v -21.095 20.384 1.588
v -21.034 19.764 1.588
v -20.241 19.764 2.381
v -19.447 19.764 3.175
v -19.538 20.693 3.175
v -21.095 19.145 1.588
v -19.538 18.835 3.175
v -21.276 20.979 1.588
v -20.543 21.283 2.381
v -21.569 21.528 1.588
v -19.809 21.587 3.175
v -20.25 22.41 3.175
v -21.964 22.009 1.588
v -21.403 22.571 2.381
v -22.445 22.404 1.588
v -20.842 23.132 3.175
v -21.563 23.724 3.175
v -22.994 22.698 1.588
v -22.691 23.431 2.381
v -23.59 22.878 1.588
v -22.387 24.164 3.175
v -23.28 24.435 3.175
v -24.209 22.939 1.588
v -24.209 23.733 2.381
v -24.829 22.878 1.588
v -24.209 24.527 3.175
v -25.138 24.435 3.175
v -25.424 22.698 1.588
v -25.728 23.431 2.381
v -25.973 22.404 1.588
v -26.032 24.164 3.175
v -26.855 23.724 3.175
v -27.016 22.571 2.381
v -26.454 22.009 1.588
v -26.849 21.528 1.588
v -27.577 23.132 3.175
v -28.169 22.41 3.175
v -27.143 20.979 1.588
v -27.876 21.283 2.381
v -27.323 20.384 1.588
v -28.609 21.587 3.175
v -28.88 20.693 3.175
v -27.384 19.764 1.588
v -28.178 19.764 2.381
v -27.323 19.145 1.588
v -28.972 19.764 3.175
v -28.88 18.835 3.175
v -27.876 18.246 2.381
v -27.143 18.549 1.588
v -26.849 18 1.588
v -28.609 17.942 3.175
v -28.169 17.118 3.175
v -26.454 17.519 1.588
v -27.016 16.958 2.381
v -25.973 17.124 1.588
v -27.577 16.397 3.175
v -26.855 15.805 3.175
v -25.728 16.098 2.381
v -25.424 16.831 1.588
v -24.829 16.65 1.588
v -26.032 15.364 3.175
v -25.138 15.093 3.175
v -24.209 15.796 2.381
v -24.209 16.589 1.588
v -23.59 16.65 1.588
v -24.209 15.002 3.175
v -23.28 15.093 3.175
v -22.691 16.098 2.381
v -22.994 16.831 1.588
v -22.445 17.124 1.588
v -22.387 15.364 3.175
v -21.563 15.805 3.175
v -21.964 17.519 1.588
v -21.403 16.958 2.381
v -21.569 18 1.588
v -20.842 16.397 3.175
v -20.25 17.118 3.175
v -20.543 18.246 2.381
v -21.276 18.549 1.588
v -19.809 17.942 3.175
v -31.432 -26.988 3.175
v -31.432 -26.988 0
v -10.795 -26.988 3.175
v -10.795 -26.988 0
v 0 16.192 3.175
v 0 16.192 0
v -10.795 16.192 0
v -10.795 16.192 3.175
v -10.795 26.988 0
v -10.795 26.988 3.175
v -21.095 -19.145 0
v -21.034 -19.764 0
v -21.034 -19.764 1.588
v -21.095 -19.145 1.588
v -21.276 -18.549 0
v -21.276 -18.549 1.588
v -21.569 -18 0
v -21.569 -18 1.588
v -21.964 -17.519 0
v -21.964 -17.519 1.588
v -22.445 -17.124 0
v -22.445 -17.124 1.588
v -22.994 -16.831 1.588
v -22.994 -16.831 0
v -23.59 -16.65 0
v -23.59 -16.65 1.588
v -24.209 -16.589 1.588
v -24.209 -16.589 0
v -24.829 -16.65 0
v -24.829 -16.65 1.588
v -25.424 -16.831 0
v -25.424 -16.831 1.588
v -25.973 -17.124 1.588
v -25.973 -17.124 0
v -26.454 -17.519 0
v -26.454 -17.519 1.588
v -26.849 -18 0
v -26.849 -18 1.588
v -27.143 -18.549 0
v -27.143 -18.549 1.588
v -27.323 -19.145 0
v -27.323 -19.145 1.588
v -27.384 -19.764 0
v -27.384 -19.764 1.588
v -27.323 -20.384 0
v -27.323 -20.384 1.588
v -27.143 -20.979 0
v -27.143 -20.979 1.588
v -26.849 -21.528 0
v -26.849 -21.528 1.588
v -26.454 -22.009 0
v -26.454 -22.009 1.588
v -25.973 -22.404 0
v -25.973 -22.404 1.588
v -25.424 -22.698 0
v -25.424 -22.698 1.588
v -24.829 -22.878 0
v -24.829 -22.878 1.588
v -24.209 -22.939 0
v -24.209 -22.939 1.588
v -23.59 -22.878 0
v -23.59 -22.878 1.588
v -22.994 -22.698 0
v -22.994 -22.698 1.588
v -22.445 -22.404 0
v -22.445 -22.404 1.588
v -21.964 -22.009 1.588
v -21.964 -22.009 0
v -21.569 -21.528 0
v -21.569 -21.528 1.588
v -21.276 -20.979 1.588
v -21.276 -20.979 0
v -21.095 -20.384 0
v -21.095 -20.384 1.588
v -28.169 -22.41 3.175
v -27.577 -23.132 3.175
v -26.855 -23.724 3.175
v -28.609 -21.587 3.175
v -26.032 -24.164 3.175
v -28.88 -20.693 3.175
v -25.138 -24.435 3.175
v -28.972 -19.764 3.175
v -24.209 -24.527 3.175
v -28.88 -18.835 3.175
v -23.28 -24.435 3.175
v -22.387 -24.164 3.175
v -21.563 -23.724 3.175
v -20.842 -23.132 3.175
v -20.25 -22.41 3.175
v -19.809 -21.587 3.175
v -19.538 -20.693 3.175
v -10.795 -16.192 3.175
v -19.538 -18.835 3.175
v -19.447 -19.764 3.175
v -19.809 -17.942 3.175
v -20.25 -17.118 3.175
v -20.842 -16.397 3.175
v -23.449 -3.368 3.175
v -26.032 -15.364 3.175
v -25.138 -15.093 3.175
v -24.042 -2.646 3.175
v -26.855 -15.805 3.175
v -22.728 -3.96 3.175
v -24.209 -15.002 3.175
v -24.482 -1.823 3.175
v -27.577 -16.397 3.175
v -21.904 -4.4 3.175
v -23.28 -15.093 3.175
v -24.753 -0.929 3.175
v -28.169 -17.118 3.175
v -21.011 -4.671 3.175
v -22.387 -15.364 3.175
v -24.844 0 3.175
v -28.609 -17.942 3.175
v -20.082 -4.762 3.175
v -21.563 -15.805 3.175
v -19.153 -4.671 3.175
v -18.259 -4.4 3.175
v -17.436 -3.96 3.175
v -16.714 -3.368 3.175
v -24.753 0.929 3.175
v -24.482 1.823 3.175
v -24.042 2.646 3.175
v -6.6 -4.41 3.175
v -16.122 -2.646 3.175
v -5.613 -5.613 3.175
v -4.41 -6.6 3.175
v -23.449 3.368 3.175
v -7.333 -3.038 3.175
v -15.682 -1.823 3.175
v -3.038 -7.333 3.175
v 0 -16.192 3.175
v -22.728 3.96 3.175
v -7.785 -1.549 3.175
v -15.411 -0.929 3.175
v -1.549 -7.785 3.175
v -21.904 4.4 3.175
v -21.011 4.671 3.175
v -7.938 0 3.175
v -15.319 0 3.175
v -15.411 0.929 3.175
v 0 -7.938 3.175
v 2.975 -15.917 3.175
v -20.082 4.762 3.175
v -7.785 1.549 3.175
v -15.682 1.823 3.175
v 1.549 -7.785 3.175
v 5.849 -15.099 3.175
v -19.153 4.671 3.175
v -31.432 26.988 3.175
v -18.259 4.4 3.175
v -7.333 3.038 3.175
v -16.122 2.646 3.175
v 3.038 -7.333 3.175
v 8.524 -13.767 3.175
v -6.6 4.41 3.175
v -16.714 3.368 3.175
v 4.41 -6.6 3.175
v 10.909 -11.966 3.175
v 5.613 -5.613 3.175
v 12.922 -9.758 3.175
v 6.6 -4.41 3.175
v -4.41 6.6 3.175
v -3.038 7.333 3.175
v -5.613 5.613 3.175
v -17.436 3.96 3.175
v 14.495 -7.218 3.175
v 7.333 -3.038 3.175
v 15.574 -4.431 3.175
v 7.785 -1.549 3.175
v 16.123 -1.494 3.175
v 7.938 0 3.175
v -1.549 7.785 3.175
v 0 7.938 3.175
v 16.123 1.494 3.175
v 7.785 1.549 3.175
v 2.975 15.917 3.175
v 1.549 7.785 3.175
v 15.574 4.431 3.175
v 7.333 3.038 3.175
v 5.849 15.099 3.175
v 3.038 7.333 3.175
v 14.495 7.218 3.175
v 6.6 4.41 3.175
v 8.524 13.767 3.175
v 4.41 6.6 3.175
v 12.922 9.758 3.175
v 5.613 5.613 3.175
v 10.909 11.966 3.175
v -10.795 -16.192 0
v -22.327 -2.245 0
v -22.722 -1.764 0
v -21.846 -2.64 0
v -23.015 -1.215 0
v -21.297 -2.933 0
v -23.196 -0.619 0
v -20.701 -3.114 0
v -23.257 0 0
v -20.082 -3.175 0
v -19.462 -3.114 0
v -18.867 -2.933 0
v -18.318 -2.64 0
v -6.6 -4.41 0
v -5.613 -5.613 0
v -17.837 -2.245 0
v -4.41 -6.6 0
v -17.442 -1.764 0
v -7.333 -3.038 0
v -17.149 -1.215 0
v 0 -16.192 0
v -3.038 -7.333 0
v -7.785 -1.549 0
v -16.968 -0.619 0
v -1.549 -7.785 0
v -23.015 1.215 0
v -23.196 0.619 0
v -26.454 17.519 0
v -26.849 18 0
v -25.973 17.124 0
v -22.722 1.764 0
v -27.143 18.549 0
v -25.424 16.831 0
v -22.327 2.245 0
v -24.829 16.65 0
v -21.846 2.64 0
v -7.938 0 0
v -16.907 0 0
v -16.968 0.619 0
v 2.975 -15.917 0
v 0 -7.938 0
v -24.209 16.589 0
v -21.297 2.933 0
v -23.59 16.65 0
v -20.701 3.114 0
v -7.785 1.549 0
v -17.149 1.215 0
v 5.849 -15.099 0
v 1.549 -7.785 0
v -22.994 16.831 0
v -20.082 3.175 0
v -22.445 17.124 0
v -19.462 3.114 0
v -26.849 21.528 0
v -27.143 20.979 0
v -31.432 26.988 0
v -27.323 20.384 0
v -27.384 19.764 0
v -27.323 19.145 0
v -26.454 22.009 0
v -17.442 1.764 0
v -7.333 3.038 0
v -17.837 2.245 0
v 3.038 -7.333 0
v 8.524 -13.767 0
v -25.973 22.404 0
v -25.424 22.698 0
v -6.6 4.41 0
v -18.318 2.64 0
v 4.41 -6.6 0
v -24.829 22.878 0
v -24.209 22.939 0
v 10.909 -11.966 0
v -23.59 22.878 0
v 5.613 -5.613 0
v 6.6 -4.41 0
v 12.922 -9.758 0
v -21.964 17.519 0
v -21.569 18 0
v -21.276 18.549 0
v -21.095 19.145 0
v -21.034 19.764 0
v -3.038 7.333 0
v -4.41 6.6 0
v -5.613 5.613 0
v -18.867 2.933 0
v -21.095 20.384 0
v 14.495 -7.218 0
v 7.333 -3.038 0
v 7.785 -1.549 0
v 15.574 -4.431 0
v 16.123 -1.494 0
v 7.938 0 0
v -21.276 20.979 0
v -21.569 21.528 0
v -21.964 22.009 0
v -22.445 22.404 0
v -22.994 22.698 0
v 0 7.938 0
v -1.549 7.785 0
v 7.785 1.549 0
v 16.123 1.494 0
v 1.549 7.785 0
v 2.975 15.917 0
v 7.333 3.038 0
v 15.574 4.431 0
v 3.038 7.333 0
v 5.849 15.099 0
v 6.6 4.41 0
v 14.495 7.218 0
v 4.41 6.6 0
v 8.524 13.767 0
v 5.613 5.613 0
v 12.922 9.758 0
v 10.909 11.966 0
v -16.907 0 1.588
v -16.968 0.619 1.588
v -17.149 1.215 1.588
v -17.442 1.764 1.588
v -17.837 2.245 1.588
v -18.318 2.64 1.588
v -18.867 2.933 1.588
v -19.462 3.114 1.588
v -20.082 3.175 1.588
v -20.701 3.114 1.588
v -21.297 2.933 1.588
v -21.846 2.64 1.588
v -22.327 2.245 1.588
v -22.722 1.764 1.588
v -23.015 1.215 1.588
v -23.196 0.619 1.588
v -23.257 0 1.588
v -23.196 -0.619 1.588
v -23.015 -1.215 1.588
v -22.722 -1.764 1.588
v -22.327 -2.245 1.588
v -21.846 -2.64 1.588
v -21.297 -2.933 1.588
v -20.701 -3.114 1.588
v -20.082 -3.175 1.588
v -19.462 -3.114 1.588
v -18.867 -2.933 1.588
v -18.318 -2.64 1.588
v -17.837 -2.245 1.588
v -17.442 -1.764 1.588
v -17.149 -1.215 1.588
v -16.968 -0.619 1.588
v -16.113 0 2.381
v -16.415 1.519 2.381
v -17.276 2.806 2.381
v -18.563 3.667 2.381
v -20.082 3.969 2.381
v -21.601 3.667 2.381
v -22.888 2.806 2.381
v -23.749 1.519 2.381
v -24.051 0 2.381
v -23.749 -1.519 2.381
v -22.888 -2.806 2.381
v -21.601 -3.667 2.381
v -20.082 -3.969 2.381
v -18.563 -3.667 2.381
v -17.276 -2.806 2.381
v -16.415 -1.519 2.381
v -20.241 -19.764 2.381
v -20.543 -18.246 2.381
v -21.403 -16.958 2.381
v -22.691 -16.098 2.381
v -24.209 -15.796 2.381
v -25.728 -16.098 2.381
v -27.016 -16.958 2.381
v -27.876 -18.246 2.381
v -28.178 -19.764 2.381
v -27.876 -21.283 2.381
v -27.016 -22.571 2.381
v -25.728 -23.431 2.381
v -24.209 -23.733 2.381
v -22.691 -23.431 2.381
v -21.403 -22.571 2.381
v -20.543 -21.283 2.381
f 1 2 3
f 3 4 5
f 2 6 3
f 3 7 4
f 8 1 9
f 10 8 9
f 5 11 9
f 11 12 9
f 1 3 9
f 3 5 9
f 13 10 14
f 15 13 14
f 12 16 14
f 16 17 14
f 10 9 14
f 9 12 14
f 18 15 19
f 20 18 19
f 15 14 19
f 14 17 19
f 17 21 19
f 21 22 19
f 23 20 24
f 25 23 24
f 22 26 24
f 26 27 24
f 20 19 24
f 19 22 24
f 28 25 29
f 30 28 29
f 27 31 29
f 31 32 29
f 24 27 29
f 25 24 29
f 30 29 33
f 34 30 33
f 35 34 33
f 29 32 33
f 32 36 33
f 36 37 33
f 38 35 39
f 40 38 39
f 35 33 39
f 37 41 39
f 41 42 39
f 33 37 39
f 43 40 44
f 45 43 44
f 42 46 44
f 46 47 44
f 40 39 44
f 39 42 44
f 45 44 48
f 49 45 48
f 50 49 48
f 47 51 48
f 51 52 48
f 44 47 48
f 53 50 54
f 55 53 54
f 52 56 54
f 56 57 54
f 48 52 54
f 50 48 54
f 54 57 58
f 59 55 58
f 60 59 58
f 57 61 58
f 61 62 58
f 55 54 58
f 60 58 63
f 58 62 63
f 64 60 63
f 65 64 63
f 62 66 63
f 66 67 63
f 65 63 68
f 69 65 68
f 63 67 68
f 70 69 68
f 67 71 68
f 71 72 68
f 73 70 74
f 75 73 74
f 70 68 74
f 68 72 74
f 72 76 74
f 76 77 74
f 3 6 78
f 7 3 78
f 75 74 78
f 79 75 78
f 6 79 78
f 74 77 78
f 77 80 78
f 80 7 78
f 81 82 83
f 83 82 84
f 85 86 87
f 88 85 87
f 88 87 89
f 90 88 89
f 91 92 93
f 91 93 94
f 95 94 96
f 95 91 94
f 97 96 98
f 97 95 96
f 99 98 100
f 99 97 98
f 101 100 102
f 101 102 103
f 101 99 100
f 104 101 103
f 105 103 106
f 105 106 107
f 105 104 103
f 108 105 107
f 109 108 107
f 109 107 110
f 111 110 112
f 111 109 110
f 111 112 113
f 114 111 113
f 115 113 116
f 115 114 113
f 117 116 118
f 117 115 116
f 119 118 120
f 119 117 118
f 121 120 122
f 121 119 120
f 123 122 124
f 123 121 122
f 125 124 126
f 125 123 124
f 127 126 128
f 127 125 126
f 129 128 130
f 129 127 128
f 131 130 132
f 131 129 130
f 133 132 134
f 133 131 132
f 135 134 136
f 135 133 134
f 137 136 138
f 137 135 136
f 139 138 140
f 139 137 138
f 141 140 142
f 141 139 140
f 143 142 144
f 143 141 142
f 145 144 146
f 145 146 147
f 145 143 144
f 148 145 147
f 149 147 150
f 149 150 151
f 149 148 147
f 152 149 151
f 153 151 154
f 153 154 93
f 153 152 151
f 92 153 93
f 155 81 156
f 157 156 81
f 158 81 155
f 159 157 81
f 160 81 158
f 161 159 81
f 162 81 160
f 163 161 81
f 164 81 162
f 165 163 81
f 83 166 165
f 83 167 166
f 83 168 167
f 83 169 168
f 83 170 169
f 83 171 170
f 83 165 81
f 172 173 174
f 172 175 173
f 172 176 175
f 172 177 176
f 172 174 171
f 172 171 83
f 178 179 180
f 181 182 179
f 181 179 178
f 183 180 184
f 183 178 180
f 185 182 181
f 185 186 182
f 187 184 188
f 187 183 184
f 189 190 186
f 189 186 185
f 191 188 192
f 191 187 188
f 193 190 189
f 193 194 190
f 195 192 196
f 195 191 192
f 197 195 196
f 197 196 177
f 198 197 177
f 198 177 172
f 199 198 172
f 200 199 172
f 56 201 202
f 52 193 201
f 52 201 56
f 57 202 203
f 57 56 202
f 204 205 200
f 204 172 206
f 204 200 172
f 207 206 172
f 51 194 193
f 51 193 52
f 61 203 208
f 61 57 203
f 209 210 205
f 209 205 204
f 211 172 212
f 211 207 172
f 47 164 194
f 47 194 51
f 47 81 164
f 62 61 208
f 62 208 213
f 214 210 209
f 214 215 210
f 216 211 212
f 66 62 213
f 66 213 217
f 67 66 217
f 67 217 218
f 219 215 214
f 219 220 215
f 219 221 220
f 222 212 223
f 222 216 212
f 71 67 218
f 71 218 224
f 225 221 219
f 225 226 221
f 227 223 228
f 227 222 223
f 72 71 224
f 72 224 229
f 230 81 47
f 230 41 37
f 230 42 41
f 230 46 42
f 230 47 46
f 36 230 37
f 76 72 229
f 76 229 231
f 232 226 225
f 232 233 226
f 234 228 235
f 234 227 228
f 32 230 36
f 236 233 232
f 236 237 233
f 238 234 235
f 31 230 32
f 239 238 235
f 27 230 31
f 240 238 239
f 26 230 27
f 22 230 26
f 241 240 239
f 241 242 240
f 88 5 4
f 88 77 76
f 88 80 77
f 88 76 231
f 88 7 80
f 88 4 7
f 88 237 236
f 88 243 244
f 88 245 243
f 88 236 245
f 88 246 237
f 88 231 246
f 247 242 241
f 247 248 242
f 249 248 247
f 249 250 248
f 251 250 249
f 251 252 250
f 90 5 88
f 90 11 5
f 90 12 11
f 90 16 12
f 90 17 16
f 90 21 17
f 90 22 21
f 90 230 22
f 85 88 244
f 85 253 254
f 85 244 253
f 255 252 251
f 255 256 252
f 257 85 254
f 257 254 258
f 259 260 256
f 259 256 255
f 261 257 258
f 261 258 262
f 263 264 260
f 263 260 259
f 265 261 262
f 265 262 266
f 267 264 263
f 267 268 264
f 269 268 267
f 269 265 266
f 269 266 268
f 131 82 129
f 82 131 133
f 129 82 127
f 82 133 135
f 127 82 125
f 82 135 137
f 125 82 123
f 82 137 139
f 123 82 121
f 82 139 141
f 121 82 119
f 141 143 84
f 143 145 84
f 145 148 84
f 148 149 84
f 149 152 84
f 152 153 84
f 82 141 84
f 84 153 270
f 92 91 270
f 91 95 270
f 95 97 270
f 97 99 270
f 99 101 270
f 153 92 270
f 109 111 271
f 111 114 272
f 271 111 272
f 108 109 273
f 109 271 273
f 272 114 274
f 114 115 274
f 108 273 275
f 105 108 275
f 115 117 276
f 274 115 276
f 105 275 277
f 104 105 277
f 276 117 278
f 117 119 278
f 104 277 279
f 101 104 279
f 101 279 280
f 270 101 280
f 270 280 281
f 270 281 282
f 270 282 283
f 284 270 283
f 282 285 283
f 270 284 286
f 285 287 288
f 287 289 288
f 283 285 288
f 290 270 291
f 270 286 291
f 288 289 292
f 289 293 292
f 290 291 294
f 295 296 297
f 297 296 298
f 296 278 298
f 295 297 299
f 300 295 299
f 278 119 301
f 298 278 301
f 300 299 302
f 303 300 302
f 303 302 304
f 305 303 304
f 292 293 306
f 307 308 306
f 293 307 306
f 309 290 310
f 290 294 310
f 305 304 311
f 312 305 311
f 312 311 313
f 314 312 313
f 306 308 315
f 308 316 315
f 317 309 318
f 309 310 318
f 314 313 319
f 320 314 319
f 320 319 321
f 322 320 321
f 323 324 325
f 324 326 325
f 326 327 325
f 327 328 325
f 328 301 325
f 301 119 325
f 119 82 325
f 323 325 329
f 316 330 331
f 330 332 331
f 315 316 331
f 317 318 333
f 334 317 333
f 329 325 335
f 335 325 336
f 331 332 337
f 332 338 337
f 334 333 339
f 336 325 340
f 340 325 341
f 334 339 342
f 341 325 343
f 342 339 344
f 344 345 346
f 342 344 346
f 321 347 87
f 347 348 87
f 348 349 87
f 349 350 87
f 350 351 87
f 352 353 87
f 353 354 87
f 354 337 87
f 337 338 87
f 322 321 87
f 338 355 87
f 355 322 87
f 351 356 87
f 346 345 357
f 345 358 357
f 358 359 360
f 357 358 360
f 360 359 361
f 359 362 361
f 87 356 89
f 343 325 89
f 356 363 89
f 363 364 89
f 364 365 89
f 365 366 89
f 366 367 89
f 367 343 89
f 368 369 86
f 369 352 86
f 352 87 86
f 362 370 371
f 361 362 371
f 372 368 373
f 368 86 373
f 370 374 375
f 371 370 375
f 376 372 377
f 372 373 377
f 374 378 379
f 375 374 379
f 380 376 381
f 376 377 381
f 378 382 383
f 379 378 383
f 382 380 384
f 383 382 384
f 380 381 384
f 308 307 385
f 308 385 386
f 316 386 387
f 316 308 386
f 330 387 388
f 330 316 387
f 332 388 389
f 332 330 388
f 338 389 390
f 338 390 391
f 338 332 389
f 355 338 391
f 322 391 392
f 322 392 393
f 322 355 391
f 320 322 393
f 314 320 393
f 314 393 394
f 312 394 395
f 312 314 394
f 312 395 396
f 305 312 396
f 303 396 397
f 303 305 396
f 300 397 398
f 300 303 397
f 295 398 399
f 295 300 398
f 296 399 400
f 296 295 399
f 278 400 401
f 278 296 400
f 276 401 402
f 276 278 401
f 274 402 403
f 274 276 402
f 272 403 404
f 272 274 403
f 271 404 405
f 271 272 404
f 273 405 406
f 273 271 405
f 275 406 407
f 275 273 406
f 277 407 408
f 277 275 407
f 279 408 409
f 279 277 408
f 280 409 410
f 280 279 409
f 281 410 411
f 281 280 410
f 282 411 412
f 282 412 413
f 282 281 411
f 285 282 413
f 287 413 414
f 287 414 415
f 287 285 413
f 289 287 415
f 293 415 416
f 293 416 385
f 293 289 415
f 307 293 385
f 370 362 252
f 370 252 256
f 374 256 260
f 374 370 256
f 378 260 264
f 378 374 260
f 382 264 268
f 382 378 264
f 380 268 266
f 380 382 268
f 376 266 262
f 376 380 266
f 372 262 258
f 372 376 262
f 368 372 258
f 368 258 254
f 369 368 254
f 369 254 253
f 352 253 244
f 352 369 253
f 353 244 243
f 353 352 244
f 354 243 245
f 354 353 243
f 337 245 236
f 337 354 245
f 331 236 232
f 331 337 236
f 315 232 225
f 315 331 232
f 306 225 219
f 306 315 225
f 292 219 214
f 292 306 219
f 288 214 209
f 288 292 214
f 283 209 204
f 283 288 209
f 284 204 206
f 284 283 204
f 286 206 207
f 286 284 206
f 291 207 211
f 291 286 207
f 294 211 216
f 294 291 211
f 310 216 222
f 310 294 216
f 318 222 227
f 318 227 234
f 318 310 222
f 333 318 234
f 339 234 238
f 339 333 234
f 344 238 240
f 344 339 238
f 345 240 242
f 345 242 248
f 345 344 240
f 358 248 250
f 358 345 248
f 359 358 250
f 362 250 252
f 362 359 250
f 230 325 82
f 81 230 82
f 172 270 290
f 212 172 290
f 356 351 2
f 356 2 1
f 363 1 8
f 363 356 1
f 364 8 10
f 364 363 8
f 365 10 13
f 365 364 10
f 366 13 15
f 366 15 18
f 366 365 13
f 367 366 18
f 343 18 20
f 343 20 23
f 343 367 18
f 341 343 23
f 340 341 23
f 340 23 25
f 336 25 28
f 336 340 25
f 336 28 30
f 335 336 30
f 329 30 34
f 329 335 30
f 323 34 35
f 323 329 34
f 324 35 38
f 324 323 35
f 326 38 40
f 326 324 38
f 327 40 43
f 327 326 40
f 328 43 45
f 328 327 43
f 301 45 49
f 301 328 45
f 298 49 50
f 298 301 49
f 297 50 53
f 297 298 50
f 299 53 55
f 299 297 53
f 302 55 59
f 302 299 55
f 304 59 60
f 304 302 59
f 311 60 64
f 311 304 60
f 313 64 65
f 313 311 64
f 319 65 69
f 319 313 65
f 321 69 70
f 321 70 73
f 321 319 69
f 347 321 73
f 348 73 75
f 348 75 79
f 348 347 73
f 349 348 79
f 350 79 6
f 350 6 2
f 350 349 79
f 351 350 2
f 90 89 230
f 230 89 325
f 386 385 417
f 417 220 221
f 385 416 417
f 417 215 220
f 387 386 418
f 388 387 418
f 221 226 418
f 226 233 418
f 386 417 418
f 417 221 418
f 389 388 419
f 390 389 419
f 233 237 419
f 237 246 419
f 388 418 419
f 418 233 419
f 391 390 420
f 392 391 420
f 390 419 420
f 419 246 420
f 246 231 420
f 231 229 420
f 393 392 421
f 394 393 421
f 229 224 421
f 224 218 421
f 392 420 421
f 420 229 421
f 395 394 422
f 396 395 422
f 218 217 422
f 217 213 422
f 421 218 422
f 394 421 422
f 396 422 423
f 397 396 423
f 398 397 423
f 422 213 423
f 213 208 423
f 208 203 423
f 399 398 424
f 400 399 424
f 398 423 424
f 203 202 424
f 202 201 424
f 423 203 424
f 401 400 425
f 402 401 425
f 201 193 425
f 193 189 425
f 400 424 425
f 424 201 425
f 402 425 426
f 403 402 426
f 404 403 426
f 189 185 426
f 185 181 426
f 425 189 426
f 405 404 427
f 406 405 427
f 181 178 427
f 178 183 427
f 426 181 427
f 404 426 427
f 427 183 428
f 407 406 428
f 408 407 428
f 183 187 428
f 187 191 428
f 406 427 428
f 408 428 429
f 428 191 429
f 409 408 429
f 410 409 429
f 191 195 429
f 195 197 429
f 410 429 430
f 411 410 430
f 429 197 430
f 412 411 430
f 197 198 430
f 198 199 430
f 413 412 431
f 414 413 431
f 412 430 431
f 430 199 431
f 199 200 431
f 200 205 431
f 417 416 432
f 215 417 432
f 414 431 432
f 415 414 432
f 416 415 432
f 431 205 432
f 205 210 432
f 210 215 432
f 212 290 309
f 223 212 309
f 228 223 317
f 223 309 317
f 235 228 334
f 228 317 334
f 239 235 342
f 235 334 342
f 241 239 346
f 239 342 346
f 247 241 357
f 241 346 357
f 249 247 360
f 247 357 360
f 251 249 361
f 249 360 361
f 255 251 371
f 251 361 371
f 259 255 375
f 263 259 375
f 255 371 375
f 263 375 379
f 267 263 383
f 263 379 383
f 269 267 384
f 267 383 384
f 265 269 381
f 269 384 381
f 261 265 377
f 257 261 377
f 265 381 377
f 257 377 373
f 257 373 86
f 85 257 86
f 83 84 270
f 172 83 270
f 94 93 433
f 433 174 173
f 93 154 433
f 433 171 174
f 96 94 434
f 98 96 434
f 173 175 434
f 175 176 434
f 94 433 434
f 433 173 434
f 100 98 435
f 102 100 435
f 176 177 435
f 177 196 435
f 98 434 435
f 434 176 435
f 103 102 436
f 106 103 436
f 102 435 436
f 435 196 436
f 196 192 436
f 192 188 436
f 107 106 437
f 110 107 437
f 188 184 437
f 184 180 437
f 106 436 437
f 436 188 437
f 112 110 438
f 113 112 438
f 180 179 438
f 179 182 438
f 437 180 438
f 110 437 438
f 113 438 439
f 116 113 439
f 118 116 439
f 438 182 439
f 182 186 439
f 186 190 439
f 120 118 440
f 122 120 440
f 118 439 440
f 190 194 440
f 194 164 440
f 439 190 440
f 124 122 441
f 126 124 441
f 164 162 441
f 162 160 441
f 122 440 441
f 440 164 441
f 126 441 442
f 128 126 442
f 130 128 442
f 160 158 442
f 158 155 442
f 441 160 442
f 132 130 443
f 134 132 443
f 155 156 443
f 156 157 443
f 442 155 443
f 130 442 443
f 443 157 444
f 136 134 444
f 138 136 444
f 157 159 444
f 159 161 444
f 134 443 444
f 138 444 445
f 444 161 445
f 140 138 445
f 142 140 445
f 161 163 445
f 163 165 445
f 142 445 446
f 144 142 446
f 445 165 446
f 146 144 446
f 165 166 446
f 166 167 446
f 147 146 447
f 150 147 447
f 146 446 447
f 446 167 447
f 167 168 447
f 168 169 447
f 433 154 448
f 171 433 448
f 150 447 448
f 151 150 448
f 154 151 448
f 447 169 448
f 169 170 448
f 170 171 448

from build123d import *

# Parameters (mm, degrees)
SKETCH1_R           = 7.9375
SKETCH1_R_2         = 3.175
BOSS_EXTRUDE1_DEPTH = 3.175
CHAMFER1_SIZE       = 1.5875


with BuildPart() as part:
    # Sketch1 → Boss-Extrude1 (new body)
    with BuildSketch(Plane.XY):
        with BuildLine():
            Line((0, 16.1925), (-10.795, 16.1925))
            Line((-10.795, 16.1925), (-10.795, 26.9875))
            Line((-10.795, 26.9875), (-31.4325, 26.9875))
            Line((-31.4325, 26.9875), (-31.4325, -26.9875))
            Line((-31.4325, -26.9875), (-10.795, -26.9875))
            Line((-10.795, -26.9875), (-10.795, -16.1925))
            Line((-10.795, -16.1925), (0, -16.1925))
            ThreePointArc((0, -16.1925), (16.1925, 0), (0, 16.1925))
        make_face()
        Circle(SKETCH1_R, mode=Mode.SUBTRACT)
        with Locations((-24.209375, 19.764375)):
            Circle(SKETCH1_R_2, mode=Mode.SUBTRACT)
        with Locations((-20.081875, 0)):
            Circle(SKETCH1_R_2, mode=Mode.SUBTRACT)
        with Locations((-24.209375, -19.764375)):
            Circle(SKETCH1_R_2, mode=Mode.SUBTRACT)
    extrude(amount=BOSS_EXTRUDE1_DEPTH)

    # Chamfer1
    chamfer1_edges = [part.edges().sort_by_distance(p)[0] for p in [
        (-27.384375, 19.764375, 3.175),
        (-23.256875, 0, 3.175),
        (-27.384375, -19.764375, 3.175),
    ]]
    chamfer(chamfer1_edges, length=CHAMFER1_SIZE)


solid = part.part
